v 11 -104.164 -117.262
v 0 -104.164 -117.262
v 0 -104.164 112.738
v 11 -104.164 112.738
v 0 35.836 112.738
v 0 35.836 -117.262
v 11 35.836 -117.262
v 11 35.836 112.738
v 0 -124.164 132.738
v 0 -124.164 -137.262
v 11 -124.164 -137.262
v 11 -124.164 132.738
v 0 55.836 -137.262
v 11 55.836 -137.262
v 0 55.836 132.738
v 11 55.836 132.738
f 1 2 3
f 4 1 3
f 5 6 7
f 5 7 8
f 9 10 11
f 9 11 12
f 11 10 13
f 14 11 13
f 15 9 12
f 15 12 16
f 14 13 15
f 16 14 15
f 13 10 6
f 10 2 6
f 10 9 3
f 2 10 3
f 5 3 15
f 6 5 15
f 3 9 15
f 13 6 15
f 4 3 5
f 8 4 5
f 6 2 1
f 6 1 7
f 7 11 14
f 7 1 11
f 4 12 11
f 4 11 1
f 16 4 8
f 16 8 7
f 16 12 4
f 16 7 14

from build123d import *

# Parameters (mm, degrees)
F0_W     = 180
F0_H     = 270
F0_W_2   = 140
F0_H_2   = 230
F1_DEPTH = 11


with BuildPart() as f1:
    # F0 (on Right) → F1 (new body)
    with BuildSketch(Plane.YZ):
        with Locations((-34.164113, -2.262233)):
            Rectangle(F0_W, F0_H)
        with Locations((-34.164113, -2.262233)):
            Rectangle(F0_W_2, F0_H_2, mode=Mode.SUBTRACT)
    extrude(amount=F1_DEPTH)


solid = f1.part
